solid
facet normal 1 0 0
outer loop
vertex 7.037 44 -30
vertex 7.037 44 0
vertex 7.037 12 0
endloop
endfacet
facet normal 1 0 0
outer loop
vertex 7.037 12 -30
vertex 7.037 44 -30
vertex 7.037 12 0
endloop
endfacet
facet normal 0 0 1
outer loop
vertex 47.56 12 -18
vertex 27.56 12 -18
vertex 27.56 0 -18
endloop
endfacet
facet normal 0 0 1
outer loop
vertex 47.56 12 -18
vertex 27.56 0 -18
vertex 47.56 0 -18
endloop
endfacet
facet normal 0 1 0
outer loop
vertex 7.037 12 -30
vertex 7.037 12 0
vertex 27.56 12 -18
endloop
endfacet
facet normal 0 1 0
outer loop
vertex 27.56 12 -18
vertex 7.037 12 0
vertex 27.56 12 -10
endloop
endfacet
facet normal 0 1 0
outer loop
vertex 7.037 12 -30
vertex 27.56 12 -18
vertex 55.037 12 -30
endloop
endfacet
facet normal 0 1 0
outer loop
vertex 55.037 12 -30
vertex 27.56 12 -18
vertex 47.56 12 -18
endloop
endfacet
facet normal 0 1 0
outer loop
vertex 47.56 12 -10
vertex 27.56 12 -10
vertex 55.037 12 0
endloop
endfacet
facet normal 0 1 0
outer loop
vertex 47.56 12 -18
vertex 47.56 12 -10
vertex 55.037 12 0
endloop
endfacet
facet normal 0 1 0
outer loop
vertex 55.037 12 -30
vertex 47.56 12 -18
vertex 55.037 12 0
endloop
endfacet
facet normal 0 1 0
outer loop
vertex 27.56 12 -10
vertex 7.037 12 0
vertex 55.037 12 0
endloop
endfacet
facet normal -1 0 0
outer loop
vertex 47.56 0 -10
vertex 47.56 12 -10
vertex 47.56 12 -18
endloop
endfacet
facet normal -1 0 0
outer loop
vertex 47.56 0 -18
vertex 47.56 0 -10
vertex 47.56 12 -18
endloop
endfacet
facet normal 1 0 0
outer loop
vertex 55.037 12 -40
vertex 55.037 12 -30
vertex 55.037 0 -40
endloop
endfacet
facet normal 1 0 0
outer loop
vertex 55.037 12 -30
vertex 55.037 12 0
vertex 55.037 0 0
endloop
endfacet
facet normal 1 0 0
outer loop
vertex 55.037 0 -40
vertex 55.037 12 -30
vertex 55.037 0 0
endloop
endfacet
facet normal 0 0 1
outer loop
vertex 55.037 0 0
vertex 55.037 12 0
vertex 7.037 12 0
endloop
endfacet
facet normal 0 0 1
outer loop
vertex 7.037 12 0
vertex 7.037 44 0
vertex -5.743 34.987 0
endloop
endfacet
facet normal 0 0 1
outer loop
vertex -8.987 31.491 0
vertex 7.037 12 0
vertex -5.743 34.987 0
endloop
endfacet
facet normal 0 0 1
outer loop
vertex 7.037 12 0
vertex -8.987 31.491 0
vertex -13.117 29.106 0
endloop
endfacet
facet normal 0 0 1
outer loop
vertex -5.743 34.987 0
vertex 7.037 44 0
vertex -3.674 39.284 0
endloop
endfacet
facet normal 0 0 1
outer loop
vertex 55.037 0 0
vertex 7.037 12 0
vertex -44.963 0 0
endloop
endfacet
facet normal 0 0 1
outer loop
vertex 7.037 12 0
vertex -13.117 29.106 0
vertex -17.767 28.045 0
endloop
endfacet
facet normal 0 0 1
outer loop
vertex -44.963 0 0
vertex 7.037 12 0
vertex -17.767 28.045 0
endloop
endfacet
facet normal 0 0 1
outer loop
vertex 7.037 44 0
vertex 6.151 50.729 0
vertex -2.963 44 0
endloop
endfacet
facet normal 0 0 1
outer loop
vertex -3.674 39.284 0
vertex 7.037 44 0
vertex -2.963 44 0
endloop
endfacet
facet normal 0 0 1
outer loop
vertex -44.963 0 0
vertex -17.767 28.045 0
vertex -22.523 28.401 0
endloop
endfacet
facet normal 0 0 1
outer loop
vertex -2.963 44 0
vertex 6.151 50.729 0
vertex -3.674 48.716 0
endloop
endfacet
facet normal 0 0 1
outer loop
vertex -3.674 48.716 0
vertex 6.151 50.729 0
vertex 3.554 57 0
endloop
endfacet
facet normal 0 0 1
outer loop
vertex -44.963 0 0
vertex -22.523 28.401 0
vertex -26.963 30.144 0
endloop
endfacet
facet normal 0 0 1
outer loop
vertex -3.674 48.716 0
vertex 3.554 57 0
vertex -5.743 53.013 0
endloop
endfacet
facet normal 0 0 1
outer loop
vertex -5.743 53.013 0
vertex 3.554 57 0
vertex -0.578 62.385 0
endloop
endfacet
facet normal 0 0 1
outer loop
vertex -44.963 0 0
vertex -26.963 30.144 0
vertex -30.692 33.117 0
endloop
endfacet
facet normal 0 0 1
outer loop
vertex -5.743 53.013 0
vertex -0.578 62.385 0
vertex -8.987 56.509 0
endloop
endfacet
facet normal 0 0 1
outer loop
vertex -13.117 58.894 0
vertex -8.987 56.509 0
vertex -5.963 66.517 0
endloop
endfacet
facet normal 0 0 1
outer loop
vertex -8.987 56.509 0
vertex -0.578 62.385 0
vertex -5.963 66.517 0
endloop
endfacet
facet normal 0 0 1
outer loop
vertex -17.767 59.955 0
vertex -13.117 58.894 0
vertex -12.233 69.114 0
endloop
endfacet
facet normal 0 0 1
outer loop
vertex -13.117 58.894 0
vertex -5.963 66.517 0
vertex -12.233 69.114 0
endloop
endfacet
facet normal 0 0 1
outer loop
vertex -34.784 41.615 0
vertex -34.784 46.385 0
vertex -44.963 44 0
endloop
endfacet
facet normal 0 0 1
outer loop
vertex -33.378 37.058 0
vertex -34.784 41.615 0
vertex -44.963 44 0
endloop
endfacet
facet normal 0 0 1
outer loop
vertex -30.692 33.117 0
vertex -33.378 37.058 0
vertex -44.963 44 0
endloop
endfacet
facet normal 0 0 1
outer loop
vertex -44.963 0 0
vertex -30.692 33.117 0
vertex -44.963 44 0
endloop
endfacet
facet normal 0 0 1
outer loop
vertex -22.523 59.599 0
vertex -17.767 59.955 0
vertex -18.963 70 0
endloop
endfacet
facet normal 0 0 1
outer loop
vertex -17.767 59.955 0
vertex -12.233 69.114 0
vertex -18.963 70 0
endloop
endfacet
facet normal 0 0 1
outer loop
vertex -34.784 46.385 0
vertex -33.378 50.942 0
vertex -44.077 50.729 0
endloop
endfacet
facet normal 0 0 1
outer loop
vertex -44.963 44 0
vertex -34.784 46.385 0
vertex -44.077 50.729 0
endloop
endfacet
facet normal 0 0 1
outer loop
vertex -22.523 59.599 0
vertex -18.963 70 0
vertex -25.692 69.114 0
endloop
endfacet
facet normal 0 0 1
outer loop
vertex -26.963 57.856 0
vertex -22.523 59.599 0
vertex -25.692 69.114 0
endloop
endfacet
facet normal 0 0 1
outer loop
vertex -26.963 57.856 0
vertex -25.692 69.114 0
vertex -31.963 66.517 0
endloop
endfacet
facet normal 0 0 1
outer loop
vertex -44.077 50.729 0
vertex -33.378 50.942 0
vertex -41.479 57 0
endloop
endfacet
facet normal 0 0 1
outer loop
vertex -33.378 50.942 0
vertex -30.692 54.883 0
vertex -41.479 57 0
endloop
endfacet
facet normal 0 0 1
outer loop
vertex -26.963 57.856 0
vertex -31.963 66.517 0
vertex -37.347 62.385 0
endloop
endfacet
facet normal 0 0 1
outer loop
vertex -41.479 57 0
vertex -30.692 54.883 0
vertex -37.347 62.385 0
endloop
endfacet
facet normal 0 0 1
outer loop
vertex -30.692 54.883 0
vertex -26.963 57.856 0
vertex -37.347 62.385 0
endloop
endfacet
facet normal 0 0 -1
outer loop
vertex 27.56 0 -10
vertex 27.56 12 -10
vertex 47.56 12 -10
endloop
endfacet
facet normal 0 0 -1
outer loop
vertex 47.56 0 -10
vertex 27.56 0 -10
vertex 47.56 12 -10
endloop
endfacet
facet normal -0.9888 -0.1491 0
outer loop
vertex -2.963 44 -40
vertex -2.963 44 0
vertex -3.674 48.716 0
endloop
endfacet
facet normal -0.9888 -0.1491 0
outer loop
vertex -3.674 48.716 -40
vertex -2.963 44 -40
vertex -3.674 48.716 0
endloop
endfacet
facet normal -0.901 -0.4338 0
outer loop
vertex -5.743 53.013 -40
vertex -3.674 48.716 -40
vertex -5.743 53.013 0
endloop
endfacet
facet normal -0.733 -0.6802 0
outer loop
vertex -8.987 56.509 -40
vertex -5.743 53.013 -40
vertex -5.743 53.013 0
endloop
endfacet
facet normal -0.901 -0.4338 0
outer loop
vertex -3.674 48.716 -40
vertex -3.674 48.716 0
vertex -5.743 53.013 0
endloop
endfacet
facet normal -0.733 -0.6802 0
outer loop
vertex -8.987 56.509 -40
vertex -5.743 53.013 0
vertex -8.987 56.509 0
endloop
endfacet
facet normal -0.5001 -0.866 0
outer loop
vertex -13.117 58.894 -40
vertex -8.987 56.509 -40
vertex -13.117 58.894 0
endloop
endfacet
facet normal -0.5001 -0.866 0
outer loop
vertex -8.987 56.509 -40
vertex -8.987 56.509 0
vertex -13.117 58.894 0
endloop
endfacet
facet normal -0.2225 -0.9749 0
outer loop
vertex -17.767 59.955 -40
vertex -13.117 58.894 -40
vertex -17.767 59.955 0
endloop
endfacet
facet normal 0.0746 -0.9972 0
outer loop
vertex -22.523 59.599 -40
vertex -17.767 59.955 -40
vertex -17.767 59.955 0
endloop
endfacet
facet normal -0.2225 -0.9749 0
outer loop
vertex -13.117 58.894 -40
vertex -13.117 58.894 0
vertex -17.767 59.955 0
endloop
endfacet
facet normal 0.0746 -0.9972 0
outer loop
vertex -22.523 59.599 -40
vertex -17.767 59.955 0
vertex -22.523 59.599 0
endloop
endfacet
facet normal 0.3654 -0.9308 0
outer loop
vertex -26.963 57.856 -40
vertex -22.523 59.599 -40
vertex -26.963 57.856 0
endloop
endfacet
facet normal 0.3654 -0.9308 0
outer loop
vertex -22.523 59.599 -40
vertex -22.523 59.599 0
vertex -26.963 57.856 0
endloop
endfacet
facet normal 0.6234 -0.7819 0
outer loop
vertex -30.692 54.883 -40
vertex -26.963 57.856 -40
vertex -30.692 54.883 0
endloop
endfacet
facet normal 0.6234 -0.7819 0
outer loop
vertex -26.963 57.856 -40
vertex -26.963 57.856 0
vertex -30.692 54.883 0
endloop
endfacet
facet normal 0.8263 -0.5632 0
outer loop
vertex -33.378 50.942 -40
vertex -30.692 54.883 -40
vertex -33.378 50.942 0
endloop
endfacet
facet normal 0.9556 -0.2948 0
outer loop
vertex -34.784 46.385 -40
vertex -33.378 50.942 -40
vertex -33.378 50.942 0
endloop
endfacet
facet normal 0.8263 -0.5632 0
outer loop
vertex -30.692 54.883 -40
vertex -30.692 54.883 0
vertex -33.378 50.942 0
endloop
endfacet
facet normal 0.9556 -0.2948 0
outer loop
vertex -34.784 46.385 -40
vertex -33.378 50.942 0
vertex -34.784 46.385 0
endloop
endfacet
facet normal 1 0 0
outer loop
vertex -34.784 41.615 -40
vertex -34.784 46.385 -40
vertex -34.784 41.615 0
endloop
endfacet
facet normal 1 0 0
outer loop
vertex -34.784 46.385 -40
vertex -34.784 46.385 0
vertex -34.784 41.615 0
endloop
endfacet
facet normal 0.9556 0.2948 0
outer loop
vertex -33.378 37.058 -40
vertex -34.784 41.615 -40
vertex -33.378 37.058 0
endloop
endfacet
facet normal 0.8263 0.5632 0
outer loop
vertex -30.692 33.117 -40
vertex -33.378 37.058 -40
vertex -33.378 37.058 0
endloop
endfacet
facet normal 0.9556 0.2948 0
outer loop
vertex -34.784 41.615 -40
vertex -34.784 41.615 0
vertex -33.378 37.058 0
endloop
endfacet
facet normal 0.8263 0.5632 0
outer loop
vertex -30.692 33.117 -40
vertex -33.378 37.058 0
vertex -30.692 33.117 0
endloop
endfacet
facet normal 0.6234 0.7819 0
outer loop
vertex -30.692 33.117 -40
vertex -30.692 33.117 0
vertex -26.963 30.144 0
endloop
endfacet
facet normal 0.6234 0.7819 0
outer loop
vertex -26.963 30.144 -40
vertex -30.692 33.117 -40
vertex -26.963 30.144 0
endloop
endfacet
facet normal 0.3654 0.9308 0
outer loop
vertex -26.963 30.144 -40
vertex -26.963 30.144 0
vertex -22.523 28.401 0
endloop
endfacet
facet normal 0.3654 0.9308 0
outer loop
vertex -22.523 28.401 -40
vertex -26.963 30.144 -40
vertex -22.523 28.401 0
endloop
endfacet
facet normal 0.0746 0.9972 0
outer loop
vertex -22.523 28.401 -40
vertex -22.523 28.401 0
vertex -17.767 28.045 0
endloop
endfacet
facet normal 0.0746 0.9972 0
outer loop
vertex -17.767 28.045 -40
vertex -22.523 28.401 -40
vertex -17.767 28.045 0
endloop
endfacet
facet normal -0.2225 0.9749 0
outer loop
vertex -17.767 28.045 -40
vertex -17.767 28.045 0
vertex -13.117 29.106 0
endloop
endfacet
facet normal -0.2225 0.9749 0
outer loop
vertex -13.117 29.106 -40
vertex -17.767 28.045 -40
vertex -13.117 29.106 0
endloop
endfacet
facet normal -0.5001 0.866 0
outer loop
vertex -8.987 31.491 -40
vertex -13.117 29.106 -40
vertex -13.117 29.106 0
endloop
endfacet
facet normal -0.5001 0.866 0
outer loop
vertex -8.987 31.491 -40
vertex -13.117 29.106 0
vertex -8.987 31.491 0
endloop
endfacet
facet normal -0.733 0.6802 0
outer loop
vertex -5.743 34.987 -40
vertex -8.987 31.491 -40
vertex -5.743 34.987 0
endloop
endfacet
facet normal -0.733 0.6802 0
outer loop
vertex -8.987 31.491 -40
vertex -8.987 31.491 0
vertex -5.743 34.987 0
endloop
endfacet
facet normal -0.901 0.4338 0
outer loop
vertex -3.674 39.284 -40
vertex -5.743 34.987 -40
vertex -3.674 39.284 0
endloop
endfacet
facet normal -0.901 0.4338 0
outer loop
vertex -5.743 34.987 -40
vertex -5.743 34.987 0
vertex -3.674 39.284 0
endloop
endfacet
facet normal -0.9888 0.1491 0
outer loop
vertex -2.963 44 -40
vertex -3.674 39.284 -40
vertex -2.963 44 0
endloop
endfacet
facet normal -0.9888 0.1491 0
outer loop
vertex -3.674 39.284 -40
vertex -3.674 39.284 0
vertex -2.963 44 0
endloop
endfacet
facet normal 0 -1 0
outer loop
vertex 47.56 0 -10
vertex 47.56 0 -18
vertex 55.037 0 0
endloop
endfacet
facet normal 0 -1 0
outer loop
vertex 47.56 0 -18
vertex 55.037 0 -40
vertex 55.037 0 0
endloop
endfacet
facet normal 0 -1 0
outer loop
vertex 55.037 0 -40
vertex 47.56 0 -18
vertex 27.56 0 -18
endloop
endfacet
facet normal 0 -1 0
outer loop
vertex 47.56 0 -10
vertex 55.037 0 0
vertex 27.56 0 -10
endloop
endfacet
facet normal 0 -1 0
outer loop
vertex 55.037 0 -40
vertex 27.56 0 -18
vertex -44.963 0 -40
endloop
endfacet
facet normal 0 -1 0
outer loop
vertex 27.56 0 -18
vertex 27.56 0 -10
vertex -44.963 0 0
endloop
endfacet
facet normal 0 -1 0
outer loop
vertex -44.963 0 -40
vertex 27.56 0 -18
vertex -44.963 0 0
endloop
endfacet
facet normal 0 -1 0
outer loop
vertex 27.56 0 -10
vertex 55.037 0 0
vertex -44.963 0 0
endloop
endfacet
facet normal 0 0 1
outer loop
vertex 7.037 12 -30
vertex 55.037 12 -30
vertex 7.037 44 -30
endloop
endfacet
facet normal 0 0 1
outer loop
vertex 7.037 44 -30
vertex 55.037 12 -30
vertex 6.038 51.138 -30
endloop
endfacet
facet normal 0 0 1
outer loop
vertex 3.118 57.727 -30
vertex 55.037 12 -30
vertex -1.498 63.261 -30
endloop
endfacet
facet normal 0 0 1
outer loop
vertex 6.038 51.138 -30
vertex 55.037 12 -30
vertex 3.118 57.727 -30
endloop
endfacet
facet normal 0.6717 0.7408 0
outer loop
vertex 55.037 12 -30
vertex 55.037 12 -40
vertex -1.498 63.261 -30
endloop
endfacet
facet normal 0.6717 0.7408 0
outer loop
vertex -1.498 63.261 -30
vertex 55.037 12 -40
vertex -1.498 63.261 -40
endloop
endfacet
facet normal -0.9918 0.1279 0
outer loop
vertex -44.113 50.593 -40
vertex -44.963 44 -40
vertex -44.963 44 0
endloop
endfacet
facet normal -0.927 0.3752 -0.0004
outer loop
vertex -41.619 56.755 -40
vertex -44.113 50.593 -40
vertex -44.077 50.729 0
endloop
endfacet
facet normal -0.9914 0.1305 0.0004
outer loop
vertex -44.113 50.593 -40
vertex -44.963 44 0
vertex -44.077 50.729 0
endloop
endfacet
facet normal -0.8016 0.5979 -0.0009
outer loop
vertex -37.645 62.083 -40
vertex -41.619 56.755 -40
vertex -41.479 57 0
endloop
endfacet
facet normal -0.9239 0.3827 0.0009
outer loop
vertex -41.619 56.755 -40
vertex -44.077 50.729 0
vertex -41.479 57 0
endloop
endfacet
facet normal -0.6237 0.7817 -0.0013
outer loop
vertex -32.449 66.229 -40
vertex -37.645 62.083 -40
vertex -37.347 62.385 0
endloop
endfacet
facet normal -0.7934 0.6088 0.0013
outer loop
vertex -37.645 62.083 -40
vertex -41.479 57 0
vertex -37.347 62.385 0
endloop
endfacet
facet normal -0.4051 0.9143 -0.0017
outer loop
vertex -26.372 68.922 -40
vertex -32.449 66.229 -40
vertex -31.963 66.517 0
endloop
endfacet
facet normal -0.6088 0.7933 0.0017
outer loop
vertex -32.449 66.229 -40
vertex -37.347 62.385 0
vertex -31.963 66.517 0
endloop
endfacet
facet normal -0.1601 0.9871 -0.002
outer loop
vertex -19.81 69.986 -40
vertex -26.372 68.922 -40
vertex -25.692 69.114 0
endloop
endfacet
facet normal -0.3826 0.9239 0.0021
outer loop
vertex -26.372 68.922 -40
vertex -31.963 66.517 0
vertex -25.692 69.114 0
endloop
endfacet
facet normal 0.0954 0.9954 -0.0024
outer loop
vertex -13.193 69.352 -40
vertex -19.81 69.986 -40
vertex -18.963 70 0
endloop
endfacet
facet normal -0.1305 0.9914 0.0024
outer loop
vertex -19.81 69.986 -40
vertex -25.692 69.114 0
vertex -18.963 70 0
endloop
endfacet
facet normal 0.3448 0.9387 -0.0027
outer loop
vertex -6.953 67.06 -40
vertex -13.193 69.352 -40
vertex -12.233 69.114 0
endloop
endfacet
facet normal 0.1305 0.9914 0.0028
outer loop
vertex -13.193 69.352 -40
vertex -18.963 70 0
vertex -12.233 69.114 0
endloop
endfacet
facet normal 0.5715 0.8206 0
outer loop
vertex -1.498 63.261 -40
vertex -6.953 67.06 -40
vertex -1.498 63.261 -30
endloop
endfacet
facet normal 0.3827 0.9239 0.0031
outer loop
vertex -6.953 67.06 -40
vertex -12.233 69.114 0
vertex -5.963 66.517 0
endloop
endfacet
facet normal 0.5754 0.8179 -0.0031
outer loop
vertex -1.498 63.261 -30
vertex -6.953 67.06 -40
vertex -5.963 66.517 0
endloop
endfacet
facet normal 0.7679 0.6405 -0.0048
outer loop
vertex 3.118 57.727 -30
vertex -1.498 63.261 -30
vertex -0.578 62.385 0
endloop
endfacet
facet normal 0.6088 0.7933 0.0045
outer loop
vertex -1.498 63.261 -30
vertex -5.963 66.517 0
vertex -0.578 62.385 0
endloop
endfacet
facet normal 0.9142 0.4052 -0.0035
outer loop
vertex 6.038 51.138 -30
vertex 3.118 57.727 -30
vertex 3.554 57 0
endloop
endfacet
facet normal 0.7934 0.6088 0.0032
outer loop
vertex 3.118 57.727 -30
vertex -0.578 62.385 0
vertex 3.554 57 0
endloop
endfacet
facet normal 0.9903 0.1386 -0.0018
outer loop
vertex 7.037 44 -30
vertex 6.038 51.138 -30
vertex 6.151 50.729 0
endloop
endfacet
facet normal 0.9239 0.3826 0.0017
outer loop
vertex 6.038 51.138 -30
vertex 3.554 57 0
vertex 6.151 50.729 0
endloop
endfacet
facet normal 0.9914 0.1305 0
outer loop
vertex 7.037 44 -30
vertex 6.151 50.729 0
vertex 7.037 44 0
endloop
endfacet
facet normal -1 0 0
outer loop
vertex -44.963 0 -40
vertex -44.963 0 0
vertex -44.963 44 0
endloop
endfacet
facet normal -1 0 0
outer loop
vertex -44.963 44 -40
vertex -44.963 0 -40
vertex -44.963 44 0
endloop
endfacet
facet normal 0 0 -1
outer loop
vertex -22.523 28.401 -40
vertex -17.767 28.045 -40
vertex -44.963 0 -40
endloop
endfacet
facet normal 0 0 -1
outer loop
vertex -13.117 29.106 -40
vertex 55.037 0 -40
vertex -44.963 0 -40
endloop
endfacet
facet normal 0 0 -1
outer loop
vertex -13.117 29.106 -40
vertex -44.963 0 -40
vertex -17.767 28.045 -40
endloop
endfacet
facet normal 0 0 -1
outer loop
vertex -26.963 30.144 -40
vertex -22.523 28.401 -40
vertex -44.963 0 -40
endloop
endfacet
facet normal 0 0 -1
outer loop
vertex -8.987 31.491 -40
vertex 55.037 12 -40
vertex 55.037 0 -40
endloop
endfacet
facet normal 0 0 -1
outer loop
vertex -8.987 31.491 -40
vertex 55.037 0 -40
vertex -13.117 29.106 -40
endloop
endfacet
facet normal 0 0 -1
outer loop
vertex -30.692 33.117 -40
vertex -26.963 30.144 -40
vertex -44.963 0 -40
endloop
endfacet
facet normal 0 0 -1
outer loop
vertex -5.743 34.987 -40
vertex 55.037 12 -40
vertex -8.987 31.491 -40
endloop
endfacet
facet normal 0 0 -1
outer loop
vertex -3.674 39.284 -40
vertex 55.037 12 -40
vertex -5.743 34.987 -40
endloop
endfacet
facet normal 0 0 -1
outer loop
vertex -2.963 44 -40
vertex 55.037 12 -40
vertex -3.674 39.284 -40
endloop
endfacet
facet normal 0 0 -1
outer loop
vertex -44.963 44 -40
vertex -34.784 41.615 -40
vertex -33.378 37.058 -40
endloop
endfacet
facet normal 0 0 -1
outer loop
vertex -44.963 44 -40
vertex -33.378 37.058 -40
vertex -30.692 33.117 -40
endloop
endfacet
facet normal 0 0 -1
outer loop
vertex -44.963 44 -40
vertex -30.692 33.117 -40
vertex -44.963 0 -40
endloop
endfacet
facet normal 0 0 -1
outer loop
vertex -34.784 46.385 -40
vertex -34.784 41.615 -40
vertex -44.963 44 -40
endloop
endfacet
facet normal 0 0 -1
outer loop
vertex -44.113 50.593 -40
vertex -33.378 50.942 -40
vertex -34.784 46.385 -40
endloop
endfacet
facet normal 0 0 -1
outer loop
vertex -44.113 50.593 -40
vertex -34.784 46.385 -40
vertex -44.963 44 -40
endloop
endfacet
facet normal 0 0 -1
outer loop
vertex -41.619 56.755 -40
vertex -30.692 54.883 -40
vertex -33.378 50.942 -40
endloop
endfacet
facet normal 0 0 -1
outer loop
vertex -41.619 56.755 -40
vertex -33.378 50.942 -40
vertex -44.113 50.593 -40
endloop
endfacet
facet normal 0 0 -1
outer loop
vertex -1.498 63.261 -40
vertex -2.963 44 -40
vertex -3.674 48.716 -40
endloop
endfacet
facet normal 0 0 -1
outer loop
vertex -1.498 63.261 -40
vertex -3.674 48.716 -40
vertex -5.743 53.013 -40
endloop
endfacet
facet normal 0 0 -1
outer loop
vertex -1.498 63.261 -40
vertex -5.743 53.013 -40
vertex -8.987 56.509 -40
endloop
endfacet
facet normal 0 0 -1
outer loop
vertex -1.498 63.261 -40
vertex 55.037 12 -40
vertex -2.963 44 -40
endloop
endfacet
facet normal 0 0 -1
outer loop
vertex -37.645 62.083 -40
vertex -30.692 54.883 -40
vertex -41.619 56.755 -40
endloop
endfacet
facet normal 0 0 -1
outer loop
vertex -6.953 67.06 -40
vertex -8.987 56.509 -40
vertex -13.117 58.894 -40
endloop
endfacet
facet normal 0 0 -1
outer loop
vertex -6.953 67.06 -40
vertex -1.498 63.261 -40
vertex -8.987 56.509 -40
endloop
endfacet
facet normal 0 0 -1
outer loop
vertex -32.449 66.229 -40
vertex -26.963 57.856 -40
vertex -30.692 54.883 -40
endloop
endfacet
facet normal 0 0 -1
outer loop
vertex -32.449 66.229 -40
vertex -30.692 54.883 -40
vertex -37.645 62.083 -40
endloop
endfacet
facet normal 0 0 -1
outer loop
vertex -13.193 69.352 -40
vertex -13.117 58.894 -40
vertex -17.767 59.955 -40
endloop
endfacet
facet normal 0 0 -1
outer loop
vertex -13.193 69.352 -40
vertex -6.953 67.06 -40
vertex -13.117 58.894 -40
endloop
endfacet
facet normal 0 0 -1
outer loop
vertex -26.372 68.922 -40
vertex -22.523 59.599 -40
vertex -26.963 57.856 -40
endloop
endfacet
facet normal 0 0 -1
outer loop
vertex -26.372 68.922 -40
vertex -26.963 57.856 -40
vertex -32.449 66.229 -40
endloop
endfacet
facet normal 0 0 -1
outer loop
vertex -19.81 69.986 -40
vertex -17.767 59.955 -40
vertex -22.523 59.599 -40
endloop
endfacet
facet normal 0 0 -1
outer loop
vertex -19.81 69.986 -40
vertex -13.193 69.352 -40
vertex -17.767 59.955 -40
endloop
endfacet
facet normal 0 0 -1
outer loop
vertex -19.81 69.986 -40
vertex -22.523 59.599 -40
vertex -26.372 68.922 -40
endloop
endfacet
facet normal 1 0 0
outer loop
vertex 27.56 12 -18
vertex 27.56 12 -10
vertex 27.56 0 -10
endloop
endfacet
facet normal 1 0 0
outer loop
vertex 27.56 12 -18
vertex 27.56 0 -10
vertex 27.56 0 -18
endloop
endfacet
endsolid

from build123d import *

# Parameters (mm, degrees)
SKETCH1_R           = 16
BOSS_EXTRUDE1_DEPTH = 40
RIB1_REACH          = 99.617
SKETCH5_WALL_W      = 273.54941501
SKETCH5_WALL_H      = 10
SKETCH8_W           = 20
SKETCH8_H           = 8
CUT_EXTRUDE2_DEPTH  = 40


with BuildPart() as part:
    # Sketch1 → Boss-Extrude1 (new body)
    with BuildSketch(Plane.XY):
        with BuildLine():
            Line((-44.962686567, 12), (-44.962686567, 44))
            ThreePointArc((-44.962686567, 44), (-18.962686567, 70), (7.037313433, 44))
            Line((7.037313433, 44), (7.037313433, 12))
            Line((7.037313433, 12), (55.037313433, 12))
            Line((55.037313433, 12), (55.037313433, 0))
            Line((55.037313433, 0), (-44.962686567, 0))
            Line((-44.962686567, 0), (-44.962686567, 12))
        make_face()
        with Locations((-18.962686567, 44)):
            Circle(SKETCH1_R, mode=Mode.SUBTRACT)
    extrude(amount=-BOSS_EXTRUDE1_DEPTH)

    # Sketch5 wall → Rib1 (add, up to next)
    with BuildSketch(Plane(origin=(26.769481976, 37.630640297, -40), x_dir=(-0.740818472674, 0.671705285483, 0), z_dir=(-0.671705285483, -0.740818472674, 0)), mode=Mode.PRIVATE) as rib1_sk1:
        with Locations((0, -5)):
            Rectangle(SKETCH5_WALL_W, SKETCH5_WALL_H)
    rib1_tool1 = extrude(rib1_sk1.sketch, amount=RIB1_REACH, mode=Mode.PRIVATE) - part.part
    add(rib1_tool1.solids().sort_by_distance((26.769481976, 37.630640297, -40))[0])

    # Sketch8 → Cut-Extrude2 (cut)
    with BuildSketch(Plane(origin=(0, 12, 0), x_dir=(1, 0, 0), z_dir=(0, 1, 0))):
        with Locations((37.559585663, 14)):
            Rectangle(SKETCH8_W, SKETCH8_H)
    extrude(amount=-CUT_EXTRUDE2_DEPTH, mode=Mode.SUBTRACT)


solid = part.part
